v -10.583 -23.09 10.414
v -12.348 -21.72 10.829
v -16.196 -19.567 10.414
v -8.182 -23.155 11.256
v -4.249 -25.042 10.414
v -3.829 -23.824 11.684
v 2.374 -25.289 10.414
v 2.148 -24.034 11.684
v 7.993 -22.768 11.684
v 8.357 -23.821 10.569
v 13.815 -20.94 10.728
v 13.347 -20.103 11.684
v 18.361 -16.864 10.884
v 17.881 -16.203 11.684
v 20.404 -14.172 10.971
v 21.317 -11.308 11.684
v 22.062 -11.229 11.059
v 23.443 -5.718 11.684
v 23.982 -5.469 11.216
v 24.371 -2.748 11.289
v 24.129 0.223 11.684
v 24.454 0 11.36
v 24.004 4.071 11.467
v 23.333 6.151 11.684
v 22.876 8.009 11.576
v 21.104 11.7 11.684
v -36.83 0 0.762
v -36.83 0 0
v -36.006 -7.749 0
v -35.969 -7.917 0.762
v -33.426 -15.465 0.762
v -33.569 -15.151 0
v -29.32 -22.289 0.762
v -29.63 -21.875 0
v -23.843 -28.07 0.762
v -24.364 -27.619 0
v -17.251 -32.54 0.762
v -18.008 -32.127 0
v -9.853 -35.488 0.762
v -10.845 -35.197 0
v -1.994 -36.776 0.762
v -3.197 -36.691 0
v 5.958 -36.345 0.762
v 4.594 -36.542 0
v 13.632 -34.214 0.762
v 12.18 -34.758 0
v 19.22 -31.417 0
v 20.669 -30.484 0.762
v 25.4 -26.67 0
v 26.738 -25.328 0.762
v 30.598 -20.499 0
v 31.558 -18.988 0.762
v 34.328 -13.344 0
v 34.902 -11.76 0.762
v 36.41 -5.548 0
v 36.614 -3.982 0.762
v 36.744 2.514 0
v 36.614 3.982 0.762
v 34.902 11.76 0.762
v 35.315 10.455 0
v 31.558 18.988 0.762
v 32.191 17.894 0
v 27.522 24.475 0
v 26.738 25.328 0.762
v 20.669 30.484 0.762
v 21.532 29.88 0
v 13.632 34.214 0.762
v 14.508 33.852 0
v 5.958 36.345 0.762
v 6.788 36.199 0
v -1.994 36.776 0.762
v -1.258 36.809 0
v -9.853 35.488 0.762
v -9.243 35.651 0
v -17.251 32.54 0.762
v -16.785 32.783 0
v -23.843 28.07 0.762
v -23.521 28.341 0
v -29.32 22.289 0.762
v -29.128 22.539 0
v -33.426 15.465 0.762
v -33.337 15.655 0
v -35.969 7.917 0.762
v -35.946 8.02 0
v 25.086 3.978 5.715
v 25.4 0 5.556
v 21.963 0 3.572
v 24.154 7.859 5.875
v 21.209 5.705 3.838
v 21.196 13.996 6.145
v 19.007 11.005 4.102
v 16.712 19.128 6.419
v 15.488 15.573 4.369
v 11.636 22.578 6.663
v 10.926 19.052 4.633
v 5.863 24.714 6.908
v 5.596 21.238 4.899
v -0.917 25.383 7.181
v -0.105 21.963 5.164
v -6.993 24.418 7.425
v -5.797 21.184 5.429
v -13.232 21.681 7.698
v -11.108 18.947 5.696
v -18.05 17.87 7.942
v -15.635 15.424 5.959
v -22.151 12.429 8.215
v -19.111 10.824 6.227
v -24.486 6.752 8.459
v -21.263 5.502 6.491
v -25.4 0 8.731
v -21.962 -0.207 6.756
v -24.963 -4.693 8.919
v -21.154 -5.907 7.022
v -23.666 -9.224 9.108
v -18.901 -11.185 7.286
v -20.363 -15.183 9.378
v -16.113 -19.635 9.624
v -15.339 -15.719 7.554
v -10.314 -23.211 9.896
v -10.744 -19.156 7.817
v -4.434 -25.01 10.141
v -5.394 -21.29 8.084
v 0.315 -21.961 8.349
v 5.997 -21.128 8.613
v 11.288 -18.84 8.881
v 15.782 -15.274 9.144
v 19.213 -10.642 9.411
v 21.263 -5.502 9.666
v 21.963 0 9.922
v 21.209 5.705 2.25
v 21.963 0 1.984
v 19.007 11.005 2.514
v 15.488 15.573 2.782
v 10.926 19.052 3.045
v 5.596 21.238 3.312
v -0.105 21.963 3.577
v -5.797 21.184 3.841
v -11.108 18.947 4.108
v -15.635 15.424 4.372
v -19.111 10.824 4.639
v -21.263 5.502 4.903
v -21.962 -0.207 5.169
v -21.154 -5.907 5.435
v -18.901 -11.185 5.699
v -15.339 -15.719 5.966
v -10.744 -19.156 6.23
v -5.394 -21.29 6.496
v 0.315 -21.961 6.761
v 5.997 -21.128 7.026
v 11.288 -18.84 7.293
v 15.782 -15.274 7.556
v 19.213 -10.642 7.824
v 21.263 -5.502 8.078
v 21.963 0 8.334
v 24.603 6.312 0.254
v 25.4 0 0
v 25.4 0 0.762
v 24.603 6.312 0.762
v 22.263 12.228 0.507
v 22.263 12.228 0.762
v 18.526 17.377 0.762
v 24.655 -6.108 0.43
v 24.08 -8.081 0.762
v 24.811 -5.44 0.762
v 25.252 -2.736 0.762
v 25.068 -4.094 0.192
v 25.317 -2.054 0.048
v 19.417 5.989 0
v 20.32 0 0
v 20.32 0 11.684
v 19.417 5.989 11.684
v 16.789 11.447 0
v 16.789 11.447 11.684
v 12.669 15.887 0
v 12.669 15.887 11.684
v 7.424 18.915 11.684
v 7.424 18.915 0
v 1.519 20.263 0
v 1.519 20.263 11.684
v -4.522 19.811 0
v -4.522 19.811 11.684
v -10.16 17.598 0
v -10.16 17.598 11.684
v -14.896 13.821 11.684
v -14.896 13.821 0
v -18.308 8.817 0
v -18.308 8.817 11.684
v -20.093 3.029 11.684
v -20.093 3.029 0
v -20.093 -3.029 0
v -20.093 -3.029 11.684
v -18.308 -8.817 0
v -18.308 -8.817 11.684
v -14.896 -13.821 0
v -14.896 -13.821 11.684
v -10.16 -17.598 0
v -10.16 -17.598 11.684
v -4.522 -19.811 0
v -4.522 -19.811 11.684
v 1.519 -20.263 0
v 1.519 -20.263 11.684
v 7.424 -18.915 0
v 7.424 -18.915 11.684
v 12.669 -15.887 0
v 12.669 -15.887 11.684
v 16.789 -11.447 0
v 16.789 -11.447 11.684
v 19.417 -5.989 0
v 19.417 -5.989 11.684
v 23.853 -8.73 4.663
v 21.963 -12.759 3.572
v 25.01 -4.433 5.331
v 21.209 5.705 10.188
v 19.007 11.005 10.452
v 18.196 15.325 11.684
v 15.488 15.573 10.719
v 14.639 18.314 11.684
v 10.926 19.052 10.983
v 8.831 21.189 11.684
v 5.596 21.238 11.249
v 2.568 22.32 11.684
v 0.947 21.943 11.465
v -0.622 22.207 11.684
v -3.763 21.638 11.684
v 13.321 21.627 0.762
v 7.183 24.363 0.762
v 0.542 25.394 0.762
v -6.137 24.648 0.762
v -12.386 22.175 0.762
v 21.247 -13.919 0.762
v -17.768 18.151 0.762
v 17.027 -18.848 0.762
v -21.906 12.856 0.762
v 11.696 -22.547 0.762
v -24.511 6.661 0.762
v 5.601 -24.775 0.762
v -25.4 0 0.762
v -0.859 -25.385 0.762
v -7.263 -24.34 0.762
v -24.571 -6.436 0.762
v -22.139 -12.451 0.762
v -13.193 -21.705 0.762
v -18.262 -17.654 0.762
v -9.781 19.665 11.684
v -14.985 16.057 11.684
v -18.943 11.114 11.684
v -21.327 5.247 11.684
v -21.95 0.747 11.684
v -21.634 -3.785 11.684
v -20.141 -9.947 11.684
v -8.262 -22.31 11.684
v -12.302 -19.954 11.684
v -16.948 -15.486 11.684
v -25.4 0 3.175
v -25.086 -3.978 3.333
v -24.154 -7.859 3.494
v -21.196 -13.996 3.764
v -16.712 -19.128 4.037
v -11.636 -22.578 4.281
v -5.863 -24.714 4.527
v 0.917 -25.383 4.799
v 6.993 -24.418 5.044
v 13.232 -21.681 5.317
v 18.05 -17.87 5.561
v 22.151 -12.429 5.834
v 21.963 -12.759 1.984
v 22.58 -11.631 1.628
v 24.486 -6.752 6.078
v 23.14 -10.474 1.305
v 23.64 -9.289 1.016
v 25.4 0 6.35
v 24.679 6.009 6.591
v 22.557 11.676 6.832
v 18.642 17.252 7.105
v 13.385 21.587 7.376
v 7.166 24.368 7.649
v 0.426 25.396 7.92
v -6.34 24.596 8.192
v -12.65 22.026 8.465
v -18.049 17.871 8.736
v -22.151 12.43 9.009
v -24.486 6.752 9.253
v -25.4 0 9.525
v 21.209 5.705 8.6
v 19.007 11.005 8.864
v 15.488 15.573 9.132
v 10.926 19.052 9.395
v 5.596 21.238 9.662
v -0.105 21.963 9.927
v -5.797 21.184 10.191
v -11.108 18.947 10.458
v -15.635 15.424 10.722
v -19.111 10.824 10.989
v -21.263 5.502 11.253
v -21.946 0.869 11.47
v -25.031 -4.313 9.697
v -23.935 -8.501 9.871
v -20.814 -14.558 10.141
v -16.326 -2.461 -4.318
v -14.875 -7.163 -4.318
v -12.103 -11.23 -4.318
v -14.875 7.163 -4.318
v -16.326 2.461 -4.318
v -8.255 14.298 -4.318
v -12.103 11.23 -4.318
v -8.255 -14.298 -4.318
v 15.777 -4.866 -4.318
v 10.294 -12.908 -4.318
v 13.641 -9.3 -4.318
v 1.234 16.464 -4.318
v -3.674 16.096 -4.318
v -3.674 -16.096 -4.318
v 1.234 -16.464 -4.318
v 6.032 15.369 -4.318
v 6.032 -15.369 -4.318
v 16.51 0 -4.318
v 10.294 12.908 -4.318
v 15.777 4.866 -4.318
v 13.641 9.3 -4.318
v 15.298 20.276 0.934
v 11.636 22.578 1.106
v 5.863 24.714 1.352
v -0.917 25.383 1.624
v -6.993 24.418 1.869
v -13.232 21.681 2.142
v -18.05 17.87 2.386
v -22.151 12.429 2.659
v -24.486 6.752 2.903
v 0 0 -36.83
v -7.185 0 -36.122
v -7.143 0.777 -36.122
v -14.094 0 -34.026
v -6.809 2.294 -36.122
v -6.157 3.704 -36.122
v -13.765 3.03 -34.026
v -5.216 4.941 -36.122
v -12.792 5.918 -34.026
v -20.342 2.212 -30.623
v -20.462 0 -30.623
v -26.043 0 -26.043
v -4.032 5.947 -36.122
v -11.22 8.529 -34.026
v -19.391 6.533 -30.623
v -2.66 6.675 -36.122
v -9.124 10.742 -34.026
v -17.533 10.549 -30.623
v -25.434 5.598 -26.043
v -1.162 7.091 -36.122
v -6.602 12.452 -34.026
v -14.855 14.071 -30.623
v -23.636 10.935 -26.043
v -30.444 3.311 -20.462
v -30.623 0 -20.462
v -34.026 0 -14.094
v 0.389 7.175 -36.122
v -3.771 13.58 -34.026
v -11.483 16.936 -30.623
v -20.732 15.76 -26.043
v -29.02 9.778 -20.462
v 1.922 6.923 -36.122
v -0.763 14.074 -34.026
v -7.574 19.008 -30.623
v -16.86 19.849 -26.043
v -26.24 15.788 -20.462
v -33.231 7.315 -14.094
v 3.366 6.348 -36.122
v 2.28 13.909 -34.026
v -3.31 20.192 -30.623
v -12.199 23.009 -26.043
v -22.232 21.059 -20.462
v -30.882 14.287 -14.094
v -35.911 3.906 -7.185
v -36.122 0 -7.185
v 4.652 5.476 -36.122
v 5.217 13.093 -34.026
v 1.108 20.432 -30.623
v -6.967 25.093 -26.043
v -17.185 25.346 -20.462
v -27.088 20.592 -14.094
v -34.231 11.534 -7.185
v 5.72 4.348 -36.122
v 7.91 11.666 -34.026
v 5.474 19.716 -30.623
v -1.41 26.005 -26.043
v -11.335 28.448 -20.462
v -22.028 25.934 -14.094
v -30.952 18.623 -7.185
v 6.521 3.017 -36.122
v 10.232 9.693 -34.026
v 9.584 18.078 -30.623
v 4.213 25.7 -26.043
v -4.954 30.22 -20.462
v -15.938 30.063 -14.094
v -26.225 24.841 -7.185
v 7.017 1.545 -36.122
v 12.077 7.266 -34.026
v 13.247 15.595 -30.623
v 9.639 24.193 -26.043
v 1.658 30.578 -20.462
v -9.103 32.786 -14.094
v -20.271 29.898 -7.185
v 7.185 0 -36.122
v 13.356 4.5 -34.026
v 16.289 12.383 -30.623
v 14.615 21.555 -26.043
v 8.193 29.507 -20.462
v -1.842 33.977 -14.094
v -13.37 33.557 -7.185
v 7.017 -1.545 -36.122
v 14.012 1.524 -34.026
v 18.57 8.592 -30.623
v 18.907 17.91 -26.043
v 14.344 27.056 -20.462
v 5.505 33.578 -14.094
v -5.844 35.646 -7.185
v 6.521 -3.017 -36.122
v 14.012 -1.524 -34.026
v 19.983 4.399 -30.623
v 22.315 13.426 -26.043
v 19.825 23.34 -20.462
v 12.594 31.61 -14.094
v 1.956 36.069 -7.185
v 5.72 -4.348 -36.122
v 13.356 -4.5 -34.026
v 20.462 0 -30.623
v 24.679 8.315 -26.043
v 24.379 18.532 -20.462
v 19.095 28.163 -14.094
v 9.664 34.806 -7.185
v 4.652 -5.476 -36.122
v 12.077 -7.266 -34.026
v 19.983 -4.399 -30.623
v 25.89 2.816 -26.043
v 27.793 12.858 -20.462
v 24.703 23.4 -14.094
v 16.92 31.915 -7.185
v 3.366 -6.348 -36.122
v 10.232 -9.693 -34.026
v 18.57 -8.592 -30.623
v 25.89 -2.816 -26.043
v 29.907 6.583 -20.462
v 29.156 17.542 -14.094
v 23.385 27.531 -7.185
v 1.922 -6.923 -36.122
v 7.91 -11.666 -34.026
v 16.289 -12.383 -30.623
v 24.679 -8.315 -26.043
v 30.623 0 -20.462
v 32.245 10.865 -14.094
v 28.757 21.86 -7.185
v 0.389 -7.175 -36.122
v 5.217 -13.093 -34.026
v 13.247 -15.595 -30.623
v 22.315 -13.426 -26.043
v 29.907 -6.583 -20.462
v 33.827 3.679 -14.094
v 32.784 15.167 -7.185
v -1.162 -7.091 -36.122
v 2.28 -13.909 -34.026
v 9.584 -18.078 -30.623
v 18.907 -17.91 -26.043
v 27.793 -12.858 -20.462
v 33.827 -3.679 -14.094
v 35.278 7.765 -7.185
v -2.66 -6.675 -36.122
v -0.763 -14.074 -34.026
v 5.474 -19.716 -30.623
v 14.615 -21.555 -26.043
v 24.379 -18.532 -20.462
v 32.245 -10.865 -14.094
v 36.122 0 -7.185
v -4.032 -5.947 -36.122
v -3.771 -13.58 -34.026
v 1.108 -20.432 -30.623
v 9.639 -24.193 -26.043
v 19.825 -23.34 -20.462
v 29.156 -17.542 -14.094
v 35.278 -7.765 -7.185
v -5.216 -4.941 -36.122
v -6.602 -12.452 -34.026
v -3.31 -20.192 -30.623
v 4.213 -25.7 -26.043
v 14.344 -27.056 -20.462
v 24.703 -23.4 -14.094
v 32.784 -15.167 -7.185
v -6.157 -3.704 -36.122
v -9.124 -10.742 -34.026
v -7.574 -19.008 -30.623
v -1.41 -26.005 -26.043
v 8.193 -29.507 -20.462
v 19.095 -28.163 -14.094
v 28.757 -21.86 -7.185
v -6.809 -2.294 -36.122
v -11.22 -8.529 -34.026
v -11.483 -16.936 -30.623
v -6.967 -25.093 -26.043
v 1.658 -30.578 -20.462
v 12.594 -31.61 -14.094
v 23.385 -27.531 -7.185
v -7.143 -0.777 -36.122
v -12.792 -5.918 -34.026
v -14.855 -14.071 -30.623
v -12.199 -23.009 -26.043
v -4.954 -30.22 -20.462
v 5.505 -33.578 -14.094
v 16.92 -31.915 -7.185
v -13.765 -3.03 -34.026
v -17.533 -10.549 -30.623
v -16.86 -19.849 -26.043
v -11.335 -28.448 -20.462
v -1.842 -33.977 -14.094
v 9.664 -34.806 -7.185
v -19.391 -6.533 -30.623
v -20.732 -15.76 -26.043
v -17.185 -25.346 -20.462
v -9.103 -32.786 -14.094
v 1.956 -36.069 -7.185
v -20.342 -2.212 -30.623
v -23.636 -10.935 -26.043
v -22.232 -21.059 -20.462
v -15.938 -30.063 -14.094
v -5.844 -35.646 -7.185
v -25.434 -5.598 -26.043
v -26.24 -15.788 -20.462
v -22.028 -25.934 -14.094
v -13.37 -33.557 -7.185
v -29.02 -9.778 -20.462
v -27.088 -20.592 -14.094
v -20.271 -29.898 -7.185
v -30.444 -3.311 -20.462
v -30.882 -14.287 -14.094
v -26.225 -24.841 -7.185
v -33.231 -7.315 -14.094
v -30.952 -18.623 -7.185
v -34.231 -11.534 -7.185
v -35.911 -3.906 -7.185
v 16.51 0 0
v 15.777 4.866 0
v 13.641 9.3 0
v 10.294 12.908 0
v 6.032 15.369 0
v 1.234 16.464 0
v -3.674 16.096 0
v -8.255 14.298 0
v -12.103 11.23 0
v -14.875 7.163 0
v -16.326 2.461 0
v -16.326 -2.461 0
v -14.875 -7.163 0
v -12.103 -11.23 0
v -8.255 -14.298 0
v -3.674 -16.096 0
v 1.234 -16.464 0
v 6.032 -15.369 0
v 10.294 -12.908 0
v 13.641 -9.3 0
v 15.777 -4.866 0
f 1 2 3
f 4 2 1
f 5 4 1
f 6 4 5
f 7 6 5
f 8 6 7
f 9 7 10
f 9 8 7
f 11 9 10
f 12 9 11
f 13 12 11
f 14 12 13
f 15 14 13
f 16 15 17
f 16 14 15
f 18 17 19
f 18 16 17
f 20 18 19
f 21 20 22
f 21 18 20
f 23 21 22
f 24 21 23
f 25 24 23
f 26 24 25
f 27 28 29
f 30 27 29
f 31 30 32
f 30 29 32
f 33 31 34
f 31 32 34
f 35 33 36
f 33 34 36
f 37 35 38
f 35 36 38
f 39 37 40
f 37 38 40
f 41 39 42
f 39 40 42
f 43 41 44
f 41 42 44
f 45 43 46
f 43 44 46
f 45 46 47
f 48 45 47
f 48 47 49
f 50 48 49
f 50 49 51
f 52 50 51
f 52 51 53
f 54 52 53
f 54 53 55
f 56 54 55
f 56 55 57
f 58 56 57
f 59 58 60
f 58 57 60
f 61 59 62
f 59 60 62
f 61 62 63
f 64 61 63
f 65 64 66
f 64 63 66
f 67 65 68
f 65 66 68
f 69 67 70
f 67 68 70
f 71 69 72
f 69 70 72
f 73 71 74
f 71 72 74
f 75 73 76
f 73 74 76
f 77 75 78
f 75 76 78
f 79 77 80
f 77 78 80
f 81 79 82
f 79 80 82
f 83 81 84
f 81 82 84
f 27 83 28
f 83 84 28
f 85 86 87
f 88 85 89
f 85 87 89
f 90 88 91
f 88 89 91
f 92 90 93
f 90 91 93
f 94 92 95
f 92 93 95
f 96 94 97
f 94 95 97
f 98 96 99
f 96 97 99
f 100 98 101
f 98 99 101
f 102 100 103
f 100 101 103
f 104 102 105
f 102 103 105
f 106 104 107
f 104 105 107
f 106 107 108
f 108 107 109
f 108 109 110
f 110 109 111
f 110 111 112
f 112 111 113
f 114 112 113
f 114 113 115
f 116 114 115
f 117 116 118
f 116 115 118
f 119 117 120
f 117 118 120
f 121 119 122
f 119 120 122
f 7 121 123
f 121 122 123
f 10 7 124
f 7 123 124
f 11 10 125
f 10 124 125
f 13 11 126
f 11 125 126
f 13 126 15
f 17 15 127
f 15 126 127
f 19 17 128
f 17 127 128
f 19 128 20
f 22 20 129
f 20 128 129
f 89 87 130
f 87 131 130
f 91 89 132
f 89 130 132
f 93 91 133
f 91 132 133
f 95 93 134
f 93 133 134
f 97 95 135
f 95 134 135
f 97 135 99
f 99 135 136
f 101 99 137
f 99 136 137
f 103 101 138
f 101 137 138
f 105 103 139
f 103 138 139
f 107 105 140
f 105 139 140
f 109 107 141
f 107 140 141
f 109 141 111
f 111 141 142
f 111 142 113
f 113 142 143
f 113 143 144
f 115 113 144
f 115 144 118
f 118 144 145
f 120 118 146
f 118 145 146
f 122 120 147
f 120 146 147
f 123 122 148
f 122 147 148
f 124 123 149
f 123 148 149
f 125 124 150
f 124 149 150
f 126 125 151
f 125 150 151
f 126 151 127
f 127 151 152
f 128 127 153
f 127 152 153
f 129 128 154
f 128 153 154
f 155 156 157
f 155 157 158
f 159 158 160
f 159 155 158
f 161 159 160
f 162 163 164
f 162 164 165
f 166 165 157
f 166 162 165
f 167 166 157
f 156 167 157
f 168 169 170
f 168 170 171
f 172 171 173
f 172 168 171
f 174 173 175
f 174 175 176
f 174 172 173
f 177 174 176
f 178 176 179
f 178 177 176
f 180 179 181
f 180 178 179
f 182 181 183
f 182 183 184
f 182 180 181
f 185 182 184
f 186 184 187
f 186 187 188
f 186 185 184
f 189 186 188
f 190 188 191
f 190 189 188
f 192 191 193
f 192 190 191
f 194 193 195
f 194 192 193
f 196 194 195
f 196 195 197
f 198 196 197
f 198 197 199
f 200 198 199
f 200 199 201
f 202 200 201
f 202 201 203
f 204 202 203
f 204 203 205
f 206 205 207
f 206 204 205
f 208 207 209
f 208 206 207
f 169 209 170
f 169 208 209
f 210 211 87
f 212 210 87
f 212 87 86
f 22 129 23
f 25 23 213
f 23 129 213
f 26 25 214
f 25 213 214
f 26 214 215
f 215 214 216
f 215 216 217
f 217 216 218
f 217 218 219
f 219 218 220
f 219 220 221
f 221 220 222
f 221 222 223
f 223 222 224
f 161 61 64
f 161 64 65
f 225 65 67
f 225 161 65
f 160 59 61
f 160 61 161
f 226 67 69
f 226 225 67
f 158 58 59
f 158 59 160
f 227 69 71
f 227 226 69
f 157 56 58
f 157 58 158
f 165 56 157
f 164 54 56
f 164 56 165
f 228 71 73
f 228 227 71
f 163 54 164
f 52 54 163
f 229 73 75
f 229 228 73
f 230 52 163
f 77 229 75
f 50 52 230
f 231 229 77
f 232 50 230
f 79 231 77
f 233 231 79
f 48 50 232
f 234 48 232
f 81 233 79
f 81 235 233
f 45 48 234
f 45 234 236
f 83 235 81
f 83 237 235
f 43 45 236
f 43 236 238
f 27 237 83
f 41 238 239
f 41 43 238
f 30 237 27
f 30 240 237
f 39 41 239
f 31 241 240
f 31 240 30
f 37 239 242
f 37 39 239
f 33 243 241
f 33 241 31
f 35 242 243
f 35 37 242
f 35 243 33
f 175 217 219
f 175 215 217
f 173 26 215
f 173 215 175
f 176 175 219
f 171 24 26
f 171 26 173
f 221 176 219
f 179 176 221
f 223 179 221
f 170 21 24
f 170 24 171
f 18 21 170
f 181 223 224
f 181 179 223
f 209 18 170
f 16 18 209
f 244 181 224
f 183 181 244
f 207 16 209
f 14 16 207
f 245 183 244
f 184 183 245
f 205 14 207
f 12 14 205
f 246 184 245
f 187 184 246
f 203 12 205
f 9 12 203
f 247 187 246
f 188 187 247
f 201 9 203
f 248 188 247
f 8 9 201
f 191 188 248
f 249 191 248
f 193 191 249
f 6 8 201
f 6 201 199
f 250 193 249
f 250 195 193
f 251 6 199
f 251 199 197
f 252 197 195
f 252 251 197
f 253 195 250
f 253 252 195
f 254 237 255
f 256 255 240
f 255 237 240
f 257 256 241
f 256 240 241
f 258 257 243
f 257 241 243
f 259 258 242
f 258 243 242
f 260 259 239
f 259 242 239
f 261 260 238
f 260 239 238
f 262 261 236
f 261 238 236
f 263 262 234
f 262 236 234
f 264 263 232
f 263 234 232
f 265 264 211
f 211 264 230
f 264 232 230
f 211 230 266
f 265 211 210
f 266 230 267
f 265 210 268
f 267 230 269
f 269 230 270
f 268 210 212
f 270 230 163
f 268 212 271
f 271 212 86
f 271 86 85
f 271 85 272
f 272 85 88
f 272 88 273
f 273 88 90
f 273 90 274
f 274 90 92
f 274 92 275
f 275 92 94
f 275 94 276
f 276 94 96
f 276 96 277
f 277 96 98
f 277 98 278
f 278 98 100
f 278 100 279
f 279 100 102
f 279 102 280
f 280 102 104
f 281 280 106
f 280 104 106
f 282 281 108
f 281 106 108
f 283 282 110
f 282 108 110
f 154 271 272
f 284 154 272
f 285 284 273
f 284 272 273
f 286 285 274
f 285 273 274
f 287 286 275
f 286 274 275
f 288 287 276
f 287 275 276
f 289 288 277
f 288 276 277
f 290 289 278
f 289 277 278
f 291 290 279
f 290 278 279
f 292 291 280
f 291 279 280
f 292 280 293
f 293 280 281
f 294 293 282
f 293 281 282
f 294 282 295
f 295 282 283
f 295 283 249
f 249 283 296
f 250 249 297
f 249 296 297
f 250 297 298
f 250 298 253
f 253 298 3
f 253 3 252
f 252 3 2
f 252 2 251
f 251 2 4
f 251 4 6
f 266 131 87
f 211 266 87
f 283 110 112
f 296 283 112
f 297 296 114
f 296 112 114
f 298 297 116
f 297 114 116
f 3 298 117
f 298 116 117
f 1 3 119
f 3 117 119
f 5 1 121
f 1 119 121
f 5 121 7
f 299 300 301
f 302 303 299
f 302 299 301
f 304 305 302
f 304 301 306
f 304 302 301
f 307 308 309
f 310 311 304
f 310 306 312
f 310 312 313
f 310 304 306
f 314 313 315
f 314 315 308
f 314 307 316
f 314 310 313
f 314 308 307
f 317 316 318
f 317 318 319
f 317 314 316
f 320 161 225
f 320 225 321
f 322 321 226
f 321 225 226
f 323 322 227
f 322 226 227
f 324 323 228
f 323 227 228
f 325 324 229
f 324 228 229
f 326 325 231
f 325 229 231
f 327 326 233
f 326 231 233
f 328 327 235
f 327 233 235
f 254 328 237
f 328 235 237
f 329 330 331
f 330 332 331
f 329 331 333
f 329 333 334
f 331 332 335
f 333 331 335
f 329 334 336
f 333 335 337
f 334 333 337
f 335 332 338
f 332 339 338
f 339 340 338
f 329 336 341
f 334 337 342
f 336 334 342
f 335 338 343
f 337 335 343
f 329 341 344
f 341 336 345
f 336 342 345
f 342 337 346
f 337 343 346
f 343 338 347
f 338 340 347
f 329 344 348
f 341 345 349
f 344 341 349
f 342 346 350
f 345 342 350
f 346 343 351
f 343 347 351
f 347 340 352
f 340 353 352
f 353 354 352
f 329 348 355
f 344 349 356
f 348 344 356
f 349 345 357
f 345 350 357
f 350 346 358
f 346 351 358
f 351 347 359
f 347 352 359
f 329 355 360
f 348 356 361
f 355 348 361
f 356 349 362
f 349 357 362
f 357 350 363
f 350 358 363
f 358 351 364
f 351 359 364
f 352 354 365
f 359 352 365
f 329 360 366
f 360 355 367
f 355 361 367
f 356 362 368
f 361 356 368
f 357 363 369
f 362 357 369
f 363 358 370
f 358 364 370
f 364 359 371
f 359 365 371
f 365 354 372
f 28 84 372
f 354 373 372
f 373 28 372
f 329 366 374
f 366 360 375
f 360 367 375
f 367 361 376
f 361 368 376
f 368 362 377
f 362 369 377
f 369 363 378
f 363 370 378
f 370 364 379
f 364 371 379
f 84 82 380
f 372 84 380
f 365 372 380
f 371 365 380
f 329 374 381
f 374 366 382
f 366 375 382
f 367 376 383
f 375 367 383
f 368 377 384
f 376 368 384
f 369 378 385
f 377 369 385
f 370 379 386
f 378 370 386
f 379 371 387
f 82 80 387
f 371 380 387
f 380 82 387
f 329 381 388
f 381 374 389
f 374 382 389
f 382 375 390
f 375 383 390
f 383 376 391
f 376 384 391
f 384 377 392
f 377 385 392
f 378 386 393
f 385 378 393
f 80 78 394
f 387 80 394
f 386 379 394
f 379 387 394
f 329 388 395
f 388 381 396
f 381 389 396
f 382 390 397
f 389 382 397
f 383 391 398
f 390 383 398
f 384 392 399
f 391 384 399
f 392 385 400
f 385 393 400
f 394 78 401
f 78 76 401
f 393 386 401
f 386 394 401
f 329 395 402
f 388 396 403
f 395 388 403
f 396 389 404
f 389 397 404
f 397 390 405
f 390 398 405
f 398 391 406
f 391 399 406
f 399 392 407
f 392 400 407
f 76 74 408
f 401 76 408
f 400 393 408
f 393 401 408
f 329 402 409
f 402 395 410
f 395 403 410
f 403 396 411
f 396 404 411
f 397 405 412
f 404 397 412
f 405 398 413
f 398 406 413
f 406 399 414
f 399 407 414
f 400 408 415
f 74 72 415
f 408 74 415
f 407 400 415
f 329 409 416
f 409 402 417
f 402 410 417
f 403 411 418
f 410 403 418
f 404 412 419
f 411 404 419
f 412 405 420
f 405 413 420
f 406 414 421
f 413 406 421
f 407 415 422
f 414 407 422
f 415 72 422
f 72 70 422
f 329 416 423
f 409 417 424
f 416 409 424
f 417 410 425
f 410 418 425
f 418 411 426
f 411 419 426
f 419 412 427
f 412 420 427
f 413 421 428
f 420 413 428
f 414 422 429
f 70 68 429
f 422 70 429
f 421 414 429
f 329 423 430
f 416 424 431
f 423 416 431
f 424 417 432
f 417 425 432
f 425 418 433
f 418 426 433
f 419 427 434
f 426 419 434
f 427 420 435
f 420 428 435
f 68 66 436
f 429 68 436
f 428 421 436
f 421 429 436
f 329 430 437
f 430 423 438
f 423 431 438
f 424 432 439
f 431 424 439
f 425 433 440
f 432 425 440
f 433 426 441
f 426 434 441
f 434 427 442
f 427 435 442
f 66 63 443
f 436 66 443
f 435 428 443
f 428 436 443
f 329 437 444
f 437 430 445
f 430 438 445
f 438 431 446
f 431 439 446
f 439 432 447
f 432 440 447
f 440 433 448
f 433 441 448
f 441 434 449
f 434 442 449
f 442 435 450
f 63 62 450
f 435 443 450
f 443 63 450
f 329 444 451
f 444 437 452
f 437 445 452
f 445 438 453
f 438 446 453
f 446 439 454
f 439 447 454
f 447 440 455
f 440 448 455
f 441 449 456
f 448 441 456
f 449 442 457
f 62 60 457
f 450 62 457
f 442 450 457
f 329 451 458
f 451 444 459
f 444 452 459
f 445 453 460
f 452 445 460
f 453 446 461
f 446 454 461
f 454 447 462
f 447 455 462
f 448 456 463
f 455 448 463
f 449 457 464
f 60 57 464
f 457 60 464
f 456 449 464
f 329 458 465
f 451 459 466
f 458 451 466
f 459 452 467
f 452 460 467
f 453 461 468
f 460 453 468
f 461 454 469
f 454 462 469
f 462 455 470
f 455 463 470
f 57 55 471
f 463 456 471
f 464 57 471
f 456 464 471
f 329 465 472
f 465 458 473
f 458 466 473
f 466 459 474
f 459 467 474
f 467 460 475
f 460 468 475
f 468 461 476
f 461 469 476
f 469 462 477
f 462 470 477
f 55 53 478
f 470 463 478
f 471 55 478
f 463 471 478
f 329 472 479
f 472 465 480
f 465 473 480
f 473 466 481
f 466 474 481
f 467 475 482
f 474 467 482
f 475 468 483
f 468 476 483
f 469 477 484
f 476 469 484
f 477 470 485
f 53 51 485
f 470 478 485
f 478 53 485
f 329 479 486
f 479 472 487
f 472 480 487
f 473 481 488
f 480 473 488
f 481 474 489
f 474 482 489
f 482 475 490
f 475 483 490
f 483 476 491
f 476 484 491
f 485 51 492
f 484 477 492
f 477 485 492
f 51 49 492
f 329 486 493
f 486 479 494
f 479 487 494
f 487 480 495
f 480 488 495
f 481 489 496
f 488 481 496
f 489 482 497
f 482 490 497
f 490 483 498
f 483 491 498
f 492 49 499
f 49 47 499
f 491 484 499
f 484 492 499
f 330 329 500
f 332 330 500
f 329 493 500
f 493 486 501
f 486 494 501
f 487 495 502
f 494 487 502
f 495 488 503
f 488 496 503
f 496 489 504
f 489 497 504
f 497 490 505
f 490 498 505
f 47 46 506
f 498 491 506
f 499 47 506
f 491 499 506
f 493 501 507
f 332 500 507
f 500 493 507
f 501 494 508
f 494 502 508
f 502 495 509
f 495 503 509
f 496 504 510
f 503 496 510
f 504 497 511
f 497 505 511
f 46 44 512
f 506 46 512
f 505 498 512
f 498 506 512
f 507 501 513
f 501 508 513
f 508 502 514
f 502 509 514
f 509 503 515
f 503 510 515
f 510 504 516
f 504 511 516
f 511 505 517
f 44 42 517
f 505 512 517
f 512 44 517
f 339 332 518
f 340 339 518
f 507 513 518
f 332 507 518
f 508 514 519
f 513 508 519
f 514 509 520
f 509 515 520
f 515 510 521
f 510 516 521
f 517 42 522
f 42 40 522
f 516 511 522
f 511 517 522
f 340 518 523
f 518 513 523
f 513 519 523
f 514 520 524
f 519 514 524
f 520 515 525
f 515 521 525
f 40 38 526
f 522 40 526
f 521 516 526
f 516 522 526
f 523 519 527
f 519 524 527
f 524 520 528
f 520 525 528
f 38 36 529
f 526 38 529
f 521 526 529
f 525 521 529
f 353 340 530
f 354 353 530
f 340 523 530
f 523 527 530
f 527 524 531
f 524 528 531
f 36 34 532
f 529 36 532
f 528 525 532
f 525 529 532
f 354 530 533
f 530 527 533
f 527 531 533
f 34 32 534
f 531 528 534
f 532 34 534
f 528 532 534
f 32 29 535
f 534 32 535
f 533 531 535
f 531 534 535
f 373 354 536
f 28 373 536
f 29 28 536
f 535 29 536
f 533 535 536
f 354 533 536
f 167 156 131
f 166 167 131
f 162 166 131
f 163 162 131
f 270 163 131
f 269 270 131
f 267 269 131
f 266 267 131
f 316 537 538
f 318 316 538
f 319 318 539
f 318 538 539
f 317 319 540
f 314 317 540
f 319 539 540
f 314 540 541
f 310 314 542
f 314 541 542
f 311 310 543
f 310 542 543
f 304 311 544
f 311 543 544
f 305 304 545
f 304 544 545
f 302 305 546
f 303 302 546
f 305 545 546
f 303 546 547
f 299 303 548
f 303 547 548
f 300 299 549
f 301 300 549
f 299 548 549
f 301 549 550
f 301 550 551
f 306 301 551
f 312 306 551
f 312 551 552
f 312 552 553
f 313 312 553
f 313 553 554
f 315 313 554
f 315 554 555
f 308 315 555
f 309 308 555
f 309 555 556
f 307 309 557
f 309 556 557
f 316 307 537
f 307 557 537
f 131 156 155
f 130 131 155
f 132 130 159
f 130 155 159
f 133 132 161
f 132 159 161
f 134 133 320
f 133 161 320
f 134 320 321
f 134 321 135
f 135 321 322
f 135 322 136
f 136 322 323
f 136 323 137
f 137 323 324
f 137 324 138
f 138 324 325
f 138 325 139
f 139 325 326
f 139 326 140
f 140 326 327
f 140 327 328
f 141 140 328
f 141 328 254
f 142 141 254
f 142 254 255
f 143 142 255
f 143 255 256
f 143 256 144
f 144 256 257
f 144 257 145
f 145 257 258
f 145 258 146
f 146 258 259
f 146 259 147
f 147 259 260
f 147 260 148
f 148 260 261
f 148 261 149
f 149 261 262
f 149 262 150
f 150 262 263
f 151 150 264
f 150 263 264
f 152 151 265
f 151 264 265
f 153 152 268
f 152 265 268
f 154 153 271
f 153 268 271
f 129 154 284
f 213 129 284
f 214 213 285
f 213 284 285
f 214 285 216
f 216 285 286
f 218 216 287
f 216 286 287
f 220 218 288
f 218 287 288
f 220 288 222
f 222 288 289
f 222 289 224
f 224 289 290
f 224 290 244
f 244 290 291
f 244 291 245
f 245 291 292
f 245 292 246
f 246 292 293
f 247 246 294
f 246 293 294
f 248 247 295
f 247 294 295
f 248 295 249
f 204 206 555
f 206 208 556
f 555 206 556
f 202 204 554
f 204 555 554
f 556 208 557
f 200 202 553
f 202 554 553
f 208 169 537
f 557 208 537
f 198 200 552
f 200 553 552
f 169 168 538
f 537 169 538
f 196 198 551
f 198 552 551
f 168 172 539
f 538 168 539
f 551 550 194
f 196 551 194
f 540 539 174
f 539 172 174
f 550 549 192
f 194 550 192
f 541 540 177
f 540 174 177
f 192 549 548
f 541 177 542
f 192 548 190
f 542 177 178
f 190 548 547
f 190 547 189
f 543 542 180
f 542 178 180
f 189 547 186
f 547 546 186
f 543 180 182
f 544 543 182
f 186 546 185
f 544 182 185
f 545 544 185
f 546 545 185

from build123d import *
from build123d.topology import SkipClean

# Parameters (mm, degrees)
SKETCH4_R           = 25.4
SKETCH4_R_2         = 20.32
BOSS_EXTRUDE1_DEPTH = 11.684
CHAMFER1_SIZE       = 1.27
THREAD3_PITCH       = 6.35
CUT_EXTRUDE2_DEPTH  = 64.791431358
SKETCH19_R          = 16.51
CUT_EXTRUDE3_DEPTH  = 4.318
SKETCH21_R          = 36.83
SKETCH21_R_2        = 25.4
BOSS_EXTRUDE2_DEPTH = 0.762


with BuildPart() as part:
    # Sketch1 → Revolve1 (revolve)
    with BuildSketch(Plane(origin=(0, 0, 0), x_dir=(1, 0, 0), z_dir=(0, 1, 0))):
        with BuildLine():
            Line((0, 0), (0, 36.83))
            ThreePointArc((0, 36.83), (-26.042742751, 26.042742751), (-36.83, 0))
            Line((-36.83, 0), (0, 0))
        make_face()
    revolve(axis=Axis((0, 0, 0), (0, 0, -1)))

    # Sketch4 → Boss-Extrude1 (add)
    with BuildSketch(Plane.XY):
        with Locations(Location((0, 0, 0), (0, 0, 180))):
            Circle(SKETCH4_R)
        Circle(SKETCH4_R_2, mode=Mode.SUBTRACT)
    extrude(amount=BOSS_EXTRUDE1_DEPTH)

    # Chamfer1
    chamfer1_edges = [part.edges().sort_by_distance(p)[0] for p in [
        (25.4, 0, 11.684),
    ]]
    chamfer(chamfer1_edges, length=CHAMFER1_SIZE)

    # Thread3: the profile of Thread Profile4 profile screwed along a right-hand helix of 1.84 turns, 14 arcs to a turn; built about Z, then put on its axis
    with SkipClean():  # the faces are left unmerged after this step: merging them gives an invalid solid
        thread3_z = Axis((0, 0, 0), (0, 0, 1))
        thread3_corners = [(25.4003, 0, -0.000173205), (25.4003, 0, 5.556423188), (21.962961694, 0, 3.571874991), (21.962961694, 0, 1.984374991)]
        with BuildLine(mode=Mode.PRIVATE) as thread3_profile:
            Line(thread3_corners[0], thread3_corners[1])
            Line(thread3_corners[1], thread3_corners[2])
            Line(thread3_corners[2], thread3_corners[3])
            Line(thread3_corners[3], thread3_corners[0])
        thread3_cap = Face(thread3_profile.wire())
        thread3_turn_angles = [0, 12.857142857, 25.714285714, 38.571428571, 51.428571429, 64.285714286, 77.142857143, 90, 102.857142857, 115.714285714, 128.571428571, 141.428571429, 154.285714286, 167.142857143, 180, 192.857142857, 205.714285714, 218.571428571, 231.428571429, 244.285714286, 257.142857143, 270, 282.857142857, 295.714285714, 308.571428571, 321.428571429, 334.285714286, 347.142857143, 360]
        thread3_turn_weights = [1, 0.9749279121818236, 1, 0.9749279121818236, 1, 0.9749279121818236, 1, 0.9749279121818236, 1, 0.9749279121818236, 1, 0.9749279121818236, 1, 0.9749279121818236, 1, 0.9749279121818236, 1, 0.9749279121818236, 1, 0.9749279121818236, 1, 0.9749279121818236, 1, 0.9749279121818237, 1, 0.9749279121818236, 1, 0.9749279121818236, 1]
        thread3_turn_rails = [Edge.make_bspline([Vector(p[0], p[1], 0).rotate(thread3_z, thread3_turn_angles[k]) / thread3_turn_weights[k] + Vector(0, 0, p[2] + THREAD3_PITCH * thread3_turn_angles[k] / 360) for k in range(29)], [0, 0, 0, 1, 1, 2, 2, 3, 3, 4, 4, 5, 5, 6, 6, 7, 7, 8, 8, 9, 9, 10, 10, 11, 11, 12, 12, 13, 13, 14, 14, 14], 2, thread3_turn_weights) for p in thread3_corners]
        thread3_turn_sides = [Face.make_surface_from_curves(thread3_turn_rails[p[0]], thread3_turn_rails[p[1]]) for p in [(0, 1), (1, 2), (2, 3), (3, 0)]]
        thread3_last_angles = [360, 372.857142857, 385.714285714, 398.571428571, 411.428571429, 424.285714286, 437.142857143, 450, 462.857142857, 475.714285714, 488.571428571, 501.428571429, 514.285714286, 527.142857143, 540, 552.857142857, 565.714285714, 578.571428571, 591.428571429, 604.285714286, 617.142857143, 630, 642.857142857, 652.628571429, 662.4]
        thread3_last_weights = [1, 0.9749279121818236, 1, 0.9749279121818236, 1, 0.9749279121818237, 1, 0.9749279121818235, 1, 0.9749279121818237, 1, 0.9749279121818237, 1, 0.9749279121818235, 1, 0.9749279121818235, 1, 0.9749279121818237, 1, 0.9749279121818237, 1, 0.9749279121818235, 1, 0.9854926535657266, 1]
        thread3_last_rails = [Edge.make_bspline([Vector(p[0], p[1], 0).rotate(thread3_z, thread3_last_angles[k]) / thread3_last_weights[k] + Vector(0, 0, p[2] + THREAD3_PITCH * thread3_last_angles[k] / 360) for k in range(25)], [0, 0, 0, 1, 1, 2, 2, 3, 3, 4, 4, 5, 5, 6, 6, 7, 7, 8, 8, 9, 9, 10, 10, 11, 11, 12, 12, 12], 2, thread3_last_weights) for p in thread3_corners]
        thread3_last_sides = [Face.make_surface_from_curves(thread3_last_rails[p[0]], thread3_last_rails[p[1]]) for p in [(0, 1), (1, 2), (2, 3), (3, 0)]]
        thread3 = Plane(origin=(0, 0, 0), x_dir=(1, 0, 0), z_dir=(0, 0, 1)) * Solid(Shell([*thread3_turn_sides, *thread3_last_sides, thread3_cap, thread3_cap.rotate(thread3_z, 662.4).moved(Location((0, 0, THREAD3_PITCH * 662.4 / 360)))]))
        add(thread3, mode=Mode.SUBTRACT)

    # Sketch18 → Cut-Extrude2 (cut, through all)
    with SkipClean():  # the faces are left unmerged after this step: merging them gives an invalid solid
        with BuildSketch(Plane(origin=(0, 0, 0), x_dir=(1, 0, 0), z_dir=(0, 1, 0))):
            Polygon((25.4, 0), (21.962961694, -1.984374991), (21.962961694, -3.571874991), (25.4, -5.556249983), align=None)
        extrude(amount=-CUT_EXTRUDE2_DEPTH, mode=Mode.SUBTRACT)

    # Sketch19 → Cut-Extrude3 (cut)
    with SkipClean():  # the faces are left unmerged after this step: merging them gives an invalid solid
        with BuildSketch(Plane.XY):
            Circle(SKETCH19_R)
        extrude(amount=-CUT_EXTRUDE3_DEPTH, mode=Mode.SUBTRACT)

    # Sketch21 → Boss-Extrude2 (add)
    with SkipClean():  # the faces are left unmerged after this step: merging them gives an invalid solid
        with BuildSketch(Plane.XY):
            with Locations(Location((0, 0, 0), (0, 0, 180))):
                Circle(SKETCH21_R)
            Circle(SKETCH21_R_2, mode=Mode.SUBTRACT)
        extrude(amount=BOSS_EXTRUDE2_DEPTH)


solid = part.part
